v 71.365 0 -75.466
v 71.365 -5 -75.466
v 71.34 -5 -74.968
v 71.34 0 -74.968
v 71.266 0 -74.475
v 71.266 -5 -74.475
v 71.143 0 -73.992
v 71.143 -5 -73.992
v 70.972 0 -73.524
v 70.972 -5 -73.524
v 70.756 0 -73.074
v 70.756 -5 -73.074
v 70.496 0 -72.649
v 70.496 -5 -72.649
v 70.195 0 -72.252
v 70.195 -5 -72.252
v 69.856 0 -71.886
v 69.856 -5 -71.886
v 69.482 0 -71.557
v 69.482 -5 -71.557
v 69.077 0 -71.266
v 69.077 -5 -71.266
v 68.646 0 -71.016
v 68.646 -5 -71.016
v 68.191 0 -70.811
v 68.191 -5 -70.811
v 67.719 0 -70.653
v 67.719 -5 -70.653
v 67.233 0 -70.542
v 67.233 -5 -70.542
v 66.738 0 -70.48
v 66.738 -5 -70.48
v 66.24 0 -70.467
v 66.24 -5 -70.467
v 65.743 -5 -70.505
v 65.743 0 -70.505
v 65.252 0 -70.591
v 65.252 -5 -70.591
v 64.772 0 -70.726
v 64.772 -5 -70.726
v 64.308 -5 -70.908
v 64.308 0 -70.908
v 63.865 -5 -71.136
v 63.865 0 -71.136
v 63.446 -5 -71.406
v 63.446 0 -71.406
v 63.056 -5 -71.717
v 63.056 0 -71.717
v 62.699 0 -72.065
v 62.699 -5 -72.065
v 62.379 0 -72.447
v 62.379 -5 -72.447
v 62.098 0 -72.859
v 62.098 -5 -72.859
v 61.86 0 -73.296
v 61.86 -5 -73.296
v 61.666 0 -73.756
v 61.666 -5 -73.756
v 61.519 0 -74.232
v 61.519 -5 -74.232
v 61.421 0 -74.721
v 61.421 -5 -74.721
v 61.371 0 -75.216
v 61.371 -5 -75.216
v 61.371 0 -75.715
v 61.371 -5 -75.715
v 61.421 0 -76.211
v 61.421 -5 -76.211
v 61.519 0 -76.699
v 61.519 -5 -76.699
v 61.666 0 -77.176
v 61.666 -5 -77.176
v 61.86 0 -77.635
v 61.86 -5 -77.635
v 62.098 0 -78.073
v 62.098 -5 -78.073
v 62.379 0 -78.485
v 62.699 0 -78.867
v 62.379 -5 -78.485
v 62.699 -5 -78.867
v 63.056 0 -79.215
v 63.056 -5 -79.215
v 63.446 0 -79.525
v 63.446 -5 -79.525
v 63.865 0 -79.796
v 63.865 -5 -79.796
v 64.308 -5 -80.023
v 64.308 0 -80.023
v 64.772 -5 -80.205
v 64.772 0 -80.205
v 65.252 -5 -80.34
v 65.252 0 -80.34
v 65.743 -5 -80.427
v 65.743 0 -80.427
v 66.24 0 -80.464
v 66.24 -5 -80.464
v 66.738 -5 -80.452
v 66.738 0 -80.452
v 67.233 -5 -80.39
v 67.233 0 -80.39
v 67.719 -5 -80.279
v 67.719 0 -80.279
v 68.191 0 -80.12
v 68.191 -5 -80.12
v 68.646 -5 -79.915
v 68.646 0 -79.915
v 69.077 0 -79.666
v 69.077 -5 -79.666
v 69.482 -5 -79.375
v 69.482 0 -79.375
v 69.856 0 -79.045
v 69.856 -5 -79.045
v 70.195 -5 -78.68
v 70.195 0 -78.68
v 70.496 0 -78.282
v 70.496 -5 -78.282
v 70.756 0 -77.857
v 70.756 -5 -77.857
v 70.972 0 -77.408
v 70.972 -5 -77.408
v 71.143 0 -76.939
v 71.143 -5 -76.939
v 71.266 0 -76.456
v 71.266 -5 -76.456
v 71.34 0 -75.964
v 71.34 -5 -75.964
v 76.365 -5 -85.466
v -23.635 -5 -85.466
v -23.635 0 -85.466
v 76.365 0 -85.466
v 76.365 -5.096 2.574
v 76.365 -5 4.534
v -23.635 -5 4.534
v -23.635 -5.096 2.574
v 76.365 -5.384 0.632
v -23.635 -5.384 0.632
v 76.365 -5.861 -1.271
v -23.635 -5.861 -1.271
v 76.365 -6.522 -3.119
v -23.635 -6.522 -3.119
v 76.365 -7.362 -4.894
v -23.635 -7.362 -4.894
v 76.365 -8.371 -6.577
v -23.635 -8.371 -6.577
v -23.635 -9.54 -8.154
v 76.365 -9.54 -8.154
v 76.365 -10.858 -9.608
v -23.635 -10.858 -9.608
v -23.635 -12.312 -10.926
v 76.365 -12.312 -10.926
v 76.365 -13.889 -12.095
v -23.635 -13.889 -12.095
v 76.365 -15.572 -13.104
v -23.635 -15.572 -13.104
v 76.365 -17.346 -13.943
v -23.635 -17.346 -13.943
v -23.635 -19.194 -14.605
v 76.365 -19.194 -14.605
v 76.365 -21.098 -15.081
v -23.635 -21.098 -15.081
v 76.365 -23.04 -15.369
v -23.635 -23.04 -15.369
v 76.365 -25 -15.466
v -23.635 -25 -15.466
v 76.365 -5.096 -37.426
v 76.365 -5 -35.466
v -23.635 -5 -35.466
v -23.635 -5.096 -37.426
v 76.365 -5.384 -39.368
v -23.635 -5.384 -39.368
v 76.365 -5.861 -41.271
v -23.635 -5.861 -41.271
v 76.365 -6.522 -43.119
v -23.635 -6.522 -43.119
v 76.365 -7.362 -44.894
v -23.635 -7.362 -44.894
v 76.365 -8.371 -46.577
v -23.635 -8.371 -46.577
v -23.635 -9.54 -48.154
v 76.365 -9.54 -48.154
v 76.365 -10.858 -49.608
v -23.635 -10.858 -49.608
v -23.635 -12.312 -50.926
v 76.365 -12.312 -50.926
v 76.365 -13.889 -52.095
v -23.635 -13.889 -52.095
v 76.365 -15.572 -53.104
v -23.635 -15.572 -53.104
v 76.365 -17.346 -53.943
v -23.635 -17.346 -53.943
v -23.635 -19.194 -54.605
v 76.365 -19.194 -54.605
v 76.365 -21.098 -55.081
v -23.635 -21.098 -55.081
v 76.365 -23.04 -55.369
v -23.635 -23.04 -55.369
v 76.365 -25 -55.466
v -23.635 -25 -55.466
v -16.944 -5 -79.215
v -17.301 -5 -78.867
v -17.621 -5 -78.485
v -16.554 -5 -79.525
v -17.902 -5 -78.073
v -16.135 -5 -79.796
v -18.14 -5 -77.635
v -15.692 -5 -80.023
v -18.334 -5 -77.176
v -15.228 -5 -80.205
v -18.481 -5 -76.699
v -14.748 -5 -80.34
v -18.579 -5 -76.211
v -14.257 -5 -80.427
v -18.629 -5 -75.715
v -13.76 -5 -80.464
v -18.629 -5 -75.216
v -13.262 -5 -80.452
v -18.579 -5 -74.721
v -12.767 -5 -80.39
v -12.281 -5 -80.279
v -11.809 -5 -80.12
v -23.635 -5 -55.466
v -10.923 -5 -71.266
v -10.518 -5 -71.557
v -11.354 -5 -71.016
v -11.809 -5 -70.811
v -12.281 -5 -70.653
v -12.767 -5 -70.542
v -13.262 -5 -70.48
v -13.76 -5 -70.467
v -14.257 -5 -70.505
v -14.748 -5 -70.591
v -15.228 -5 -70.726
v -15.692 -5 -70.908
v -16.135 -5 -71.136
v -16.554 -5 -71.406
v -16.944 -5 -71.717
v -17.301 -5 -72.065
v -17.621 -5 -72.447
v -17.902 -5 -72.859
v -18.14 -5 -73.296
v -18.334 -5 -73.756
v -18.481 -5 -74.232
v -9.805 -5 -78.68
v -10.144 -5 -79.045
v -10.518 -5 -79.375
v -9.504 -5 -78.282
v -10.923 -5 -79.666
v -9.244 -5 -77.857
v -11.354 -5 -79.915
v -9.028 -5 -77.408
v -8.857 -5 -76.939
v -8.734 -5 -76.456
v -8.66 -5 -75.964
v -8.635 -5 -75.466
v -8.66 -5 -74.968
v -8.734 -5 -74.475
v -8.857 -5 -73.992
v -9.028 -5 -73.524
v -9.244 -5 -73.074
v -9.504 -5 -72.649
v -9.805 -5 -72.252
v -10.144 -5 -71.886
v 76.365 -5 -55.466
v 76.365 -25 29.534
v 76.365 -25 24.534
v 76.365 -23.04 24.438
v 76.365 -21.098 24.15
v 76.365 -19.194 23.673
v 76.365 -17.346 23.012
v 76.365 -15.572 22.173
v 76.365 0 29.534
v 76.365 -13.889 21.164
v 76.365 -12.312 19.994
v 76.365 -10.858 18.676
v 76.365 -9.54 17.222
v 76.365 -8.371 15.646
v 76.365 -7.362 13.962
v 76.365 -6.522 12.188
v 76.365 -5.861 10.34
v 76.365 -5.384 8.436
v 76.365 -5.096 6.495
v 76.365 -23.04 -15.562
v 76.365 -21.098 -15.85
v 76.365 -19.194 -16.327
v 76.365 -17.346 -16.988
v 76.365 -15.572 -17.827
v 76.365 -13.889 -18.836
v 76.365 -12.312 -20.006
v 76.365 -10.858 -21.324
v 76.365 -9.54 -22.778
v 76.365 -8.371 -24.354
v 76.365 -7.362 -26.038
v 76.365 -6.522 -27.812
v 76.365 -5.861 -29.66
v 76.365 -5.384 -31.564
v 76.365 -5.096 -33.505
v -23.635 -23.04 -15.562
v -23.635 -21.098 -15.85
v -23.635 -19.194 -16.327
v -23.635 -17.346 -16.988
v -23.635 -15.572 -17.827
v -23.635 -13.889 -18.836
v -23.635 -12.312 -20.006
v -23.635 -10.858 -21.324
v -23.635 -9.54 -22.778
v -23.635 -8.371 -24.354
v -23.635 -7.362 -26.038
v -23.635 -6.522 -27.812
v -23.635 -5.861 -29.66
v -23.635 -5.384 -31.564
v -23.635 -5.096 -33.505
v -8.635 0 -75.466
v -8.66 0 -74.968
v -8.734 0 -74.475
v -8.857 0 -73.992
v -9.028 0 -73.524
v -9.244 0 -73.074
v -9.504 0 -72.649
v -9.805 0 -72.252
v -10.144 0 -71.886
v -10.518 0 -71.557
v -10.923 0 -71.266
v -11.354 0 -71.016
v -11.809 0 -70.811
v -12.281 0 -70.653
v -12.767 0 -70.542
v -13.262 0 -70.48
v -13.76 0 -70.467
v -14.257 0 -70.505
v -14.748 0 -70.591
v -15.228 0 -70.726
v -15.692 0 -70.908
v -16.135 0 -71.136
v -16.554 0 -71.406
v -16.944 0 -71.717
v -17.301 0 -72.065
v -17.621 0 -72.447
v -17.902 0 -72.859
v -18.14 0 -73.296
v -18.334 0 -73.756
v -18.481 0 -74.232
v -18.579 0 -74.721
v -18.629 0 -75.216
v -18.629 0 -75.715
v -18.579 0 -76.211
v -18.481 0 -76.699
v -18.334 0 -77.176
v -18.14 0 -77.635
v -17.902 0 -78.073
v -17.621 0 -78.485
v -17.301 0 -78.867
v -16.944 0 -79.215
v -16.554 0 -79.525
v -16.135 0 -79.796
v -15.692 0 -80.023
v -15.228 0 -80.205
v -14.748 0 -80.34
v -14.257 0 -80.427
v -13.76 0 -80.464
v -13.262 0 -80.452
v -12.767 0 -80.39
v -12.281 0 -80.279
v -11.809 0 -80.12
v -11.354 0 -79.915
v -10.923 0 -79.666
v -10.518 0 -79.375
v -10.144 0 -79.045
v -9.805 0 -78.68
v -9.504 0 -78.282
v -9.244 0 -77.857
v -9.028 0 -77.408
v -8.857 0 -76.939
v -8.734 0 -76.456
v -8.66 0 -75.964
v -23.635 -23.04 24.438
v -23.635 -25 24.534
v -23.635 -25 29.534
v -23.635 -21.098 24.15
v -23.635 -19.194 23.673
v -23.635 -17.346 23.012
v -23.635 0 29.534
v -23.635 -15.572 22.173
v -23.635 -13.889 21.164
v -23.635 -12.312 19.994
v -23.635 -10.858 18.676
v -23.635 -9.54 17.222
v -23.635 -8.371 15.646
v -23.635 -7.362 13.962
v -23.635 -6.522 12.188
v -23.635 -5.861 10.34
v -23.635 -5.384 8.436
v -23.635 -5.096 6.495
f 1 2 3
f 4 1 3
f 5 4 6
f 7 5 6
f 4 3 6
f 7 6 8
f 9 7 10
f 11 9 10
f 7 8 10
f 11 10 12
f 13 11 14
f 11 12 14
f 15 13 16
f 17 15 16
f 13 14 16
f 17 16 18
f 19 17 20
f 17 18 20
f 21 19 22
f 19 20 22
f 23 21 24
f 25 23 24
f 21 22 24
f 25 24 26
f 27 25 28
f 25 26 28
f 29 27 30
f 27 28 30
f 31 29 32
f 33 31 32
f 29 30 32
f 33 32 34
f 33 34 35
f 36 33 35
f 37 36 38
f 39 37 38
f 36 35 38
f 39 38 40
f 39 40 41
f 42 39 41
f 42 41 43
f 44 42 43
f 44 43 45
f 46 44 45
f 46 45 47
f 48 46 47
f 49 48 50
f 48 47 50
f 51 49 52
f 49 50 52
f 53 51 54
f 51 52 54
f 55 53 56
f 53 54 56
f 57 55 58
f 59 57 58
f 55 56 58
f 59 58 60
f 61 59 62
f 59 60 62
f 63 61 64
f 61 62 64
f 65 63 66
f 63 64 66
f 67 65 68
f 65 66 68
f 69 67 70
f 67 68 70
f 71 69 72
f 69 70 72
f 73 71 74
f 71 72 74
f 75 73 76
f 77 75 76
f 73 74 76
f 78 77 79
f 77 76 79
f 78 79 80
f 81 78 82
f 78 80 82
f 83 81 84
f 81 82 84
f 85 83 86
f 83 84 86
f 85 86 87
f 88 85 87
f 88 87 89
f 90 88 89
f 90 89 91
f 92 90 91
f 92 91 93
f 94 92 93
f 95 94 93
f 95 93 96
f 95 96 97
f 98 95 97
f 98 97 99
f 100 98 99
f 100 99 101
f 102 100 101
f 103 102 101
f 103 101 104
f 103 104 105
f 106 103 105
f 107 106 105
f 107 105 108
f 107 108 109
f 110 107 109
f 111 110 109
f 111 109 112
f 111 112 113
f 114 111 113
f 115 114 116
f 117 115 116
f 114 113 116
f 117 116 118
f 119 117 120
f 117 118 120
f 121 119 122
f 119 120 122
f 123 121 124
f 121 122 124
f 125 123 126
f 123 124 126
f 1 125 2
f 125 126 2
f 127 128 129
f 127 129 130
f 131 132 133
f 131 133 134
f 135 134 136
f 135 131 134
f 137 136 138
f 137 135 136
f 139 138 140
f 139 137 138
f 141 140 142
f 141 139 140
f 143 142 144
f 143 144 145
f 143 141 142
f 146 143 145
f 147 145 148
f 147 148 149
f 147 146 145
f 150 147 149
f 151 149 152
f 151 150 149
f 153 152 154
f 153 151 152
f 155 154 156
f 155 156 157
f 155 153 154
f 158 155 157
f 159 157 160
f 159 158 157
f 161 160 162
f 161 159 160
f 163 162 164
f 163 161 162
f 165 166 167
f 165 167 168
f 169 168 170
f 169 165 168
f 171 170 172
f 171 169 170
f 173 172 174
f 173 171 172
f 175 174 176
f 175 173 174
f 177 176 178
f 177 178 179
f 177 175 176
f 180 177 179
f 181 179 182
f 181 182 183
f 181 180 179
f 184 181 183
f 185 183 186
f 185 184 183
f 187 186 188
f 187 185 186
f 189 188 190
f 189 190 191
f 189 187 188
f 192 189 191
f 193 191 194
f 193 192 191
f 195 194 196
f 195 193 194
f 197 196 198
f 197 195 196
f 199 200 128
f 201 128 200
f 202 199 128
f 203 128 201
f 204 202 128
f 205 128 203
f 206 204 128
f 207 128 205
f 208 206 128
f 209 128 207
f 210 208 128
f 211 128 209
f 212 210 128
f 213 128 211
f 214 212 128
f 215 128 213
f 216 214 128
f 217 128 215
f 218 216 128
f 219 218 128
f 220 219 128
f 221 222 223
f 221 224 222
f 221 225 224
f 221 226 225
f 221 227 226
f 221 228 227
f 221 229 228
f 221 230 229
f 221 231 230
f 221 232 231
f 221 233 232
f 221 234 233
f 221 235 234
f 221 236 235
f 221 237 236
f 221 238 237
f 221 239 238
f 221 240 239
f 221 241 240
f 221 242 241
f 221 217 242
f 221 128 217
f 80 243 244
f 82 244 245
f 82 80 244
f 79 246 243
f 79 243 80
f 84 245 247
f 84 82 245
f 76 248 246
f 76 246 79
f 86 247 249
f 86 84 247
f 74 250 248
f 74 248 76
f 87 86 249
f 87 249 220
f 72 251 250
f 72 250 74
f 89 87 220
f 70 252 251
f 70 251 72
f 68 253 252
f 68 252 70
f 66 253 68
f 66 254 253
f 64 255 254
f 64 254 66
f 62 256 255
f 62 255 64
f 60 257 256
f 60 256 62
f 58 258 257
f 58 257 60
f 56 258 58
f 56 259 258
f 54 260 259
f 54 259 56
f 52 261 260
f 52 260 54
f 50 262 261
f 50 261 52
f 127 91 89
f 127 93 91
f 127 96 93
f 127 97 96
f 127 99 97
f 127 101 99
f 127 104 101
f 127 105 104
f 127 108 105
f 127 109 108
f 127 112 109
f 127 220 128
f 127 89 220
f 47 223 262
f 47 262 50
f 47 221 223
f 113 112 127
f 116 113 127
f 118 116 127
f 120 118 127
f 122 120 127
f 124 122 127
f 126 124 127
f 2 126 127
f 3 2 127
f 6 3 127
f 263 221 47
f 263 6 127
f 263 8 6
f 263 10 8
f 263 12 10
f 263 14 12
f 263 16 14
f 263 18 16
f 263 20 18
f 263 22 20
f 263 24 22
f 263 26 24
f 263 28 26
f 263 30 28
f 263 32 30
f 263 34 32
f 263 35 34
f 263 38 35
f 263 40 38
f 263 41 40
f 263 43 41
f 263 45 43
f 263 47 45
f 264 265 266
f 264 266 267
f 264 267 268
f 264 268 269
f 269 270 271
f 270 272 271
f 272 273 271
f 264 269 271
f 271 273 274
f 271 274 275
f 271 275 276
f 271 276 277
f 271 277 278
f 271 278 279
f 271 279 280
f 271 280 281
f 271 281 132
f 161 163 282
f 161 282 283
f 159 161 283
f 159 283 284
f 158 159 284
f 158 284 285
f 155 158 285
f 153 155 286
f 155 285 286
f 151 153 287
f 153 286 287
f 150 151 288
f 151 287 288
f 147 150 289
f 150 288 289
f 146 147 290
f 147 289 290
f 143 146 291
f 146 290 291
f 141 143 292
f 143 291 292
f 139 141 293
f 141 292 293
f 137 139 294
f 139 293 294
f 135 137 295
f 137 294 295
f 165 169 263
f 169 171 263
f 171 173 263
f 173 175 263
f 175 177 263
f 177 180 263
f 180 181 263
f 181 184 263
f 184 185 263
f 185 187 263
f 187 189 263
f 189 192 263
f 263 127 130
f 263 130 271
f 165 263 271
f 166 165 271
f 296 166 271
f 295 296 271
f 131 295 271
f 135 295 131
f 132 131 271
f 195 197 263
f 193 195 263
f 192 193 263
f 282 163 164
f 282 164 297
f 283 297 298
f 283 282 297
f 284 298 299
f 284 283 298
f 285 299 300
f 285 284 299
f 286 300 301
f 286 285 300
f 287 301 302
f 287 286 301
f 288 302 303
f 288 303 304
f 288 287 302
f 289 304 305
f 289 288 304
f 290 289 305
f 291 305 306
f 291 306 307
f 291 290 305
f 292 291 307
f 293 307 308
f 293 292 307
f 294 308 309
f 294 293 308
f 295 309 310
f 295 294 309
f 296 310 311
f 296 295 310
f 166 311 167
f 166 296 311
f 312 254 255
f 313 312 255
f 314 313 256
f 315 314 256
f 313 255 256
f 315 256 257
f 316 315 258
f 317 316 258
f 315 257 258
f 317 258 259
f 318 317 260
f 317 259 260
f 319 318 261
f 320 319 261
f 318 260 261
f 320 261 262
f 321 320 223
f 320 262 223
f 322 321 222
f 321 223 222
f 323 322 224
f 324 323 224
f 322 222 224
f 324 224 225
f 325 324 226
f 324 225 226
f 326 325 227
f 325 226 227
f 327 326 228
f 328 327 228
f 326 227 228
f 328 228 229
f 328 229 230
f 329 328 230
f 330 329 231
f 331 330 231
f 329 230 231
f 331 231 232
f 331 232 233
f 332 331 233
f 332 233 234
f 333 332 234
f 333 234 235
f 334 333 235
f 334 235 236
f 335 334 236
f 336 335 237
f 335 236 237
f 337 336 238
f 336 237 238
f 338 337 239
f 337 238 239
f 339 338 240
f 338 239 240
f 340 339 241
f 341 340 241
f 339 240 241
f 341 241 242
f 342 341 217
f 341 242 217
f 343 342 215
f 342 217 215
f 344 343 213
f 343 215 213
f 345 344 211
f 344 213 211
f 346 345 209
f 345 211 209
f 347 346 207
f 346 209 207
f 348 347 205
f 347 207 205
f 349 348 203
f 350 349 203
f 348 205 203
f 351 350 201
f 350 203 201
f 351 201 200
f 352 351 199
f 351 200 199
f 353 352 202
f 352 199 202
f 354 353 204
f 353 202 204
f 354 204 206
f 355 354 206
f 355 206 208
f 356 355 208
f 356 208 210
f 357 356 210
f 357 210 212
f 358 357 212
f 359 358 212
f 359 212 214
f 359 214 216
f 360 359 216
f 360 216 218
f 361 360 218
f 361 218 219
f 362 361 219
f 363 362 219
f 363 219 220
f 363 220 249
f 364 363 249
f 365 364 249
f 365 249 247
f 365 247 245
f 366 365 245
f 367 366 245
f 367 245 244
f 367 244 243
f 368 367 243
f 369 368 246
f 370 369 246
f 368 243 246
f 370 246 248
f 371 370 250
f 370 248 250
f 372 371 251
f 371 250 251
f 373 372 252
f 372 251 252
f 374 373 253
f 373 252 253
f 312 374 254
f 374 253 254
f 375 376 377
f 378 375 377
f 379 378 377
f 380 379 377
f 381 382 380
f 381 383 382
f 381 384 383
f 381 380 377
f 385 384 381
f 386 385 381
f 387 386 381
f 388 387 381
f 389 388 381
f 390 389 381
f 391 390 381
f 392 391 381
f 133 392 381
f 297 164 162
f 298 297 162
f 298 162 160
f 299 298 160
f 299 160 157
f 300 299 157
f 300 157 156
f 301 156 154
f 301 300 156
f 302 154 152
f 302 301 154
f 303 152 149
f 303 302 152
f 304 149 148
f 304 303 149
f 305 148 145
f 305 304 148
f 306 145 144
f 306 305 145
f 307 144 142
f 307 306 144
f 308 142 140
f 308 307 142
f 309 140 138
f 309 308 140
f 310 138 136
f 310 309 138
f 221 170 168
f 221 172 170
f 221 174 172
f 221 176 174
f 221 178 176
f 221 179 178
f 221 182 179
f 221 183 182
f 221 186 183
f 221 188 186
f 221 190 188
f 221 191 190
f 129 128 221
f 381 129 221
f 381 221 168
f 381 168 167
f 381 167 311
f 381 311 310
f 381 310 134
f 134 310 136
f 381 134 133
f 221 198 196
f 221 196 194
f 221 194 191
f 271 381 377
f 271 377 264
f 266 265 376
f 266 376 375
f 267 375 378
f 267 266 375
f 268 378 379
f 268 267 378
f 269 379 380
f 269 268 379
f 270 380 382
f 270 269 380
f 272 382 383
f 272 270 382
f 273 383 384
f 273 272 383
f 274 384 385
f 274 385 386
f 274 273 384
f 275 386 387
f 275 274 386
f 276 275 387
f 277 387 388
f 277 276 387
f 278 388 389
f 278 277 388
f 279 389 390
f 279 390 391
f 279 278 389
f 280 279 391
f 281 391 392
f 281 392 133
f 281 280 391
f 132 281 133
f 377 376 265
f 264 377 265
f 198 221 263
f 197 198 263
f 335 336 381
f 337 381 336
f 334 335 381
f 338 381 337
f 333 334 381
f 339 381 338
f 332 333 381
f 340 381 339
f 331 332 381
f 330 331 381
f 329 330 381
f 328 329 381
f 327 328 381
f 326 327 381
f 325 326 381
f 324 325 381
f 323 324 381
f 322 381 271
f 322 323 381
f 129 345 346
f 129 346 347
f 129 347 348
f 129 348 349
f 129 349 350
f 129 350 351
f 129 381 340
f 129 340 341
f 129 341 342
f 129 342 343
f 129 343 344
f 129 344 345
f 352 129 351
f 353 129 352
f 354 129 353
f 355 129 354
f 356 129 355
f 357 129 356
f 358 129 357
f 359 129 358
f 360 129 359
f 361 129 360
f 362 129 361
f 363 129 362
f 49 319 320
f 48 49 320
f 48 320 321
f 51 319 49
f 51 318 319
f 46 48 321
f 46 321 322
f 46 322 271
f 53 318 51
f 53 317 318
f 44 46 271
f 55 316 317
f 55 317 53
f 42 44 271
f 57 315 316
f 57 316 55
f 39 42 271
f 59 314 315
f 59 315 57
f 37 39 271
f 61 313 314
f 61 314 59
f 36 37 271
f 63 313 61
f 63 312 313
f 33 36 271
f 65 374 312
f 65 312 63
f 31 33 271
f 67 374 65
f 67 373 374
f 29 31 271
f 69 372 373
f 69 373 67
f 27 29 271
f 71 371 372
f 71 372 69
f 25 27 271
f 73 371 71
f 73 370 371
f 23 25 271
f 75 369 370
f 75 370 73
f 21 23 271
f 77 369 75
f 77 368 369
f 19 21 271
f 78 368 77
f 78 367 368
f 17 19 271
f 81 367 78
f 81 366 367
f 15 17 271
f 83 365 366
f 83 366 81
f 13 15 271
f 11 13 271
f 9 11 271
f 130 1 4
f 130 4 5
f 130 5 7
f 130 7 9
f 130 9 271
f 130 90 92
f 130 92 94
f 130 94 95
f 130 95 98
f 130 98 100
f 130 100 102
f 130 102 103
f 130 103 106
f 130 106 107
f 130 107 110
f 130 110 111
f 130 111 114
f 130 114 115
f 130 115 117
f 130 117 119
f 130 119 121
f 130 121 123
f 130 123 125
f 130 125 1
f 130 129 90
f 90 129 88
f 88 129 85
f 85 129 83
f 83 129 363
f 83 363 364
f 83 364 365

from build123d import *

# Parameters (mm, degrees)
F0_W     = 100
F0_H     = 80
F1_DEPTH = 5
F3_DEPTH = 100
F4_W     = 100
F4_H     = 5
F5_DEPTH = 30
F6_R     = 5
F7_DEPTH = 5
F8_W     = 100
F8_H     = 25
F9_DEPTH = 5


with BuildPart() as f1:
    # F0 (on Front) → F1 (new body)
    with BuildSketch(Plane.XZ):
        with Locations((26.364678, -15.465713)):
            Rectangle(F0_W, F0_H)
    extrude(amount=F1_DEPTH)

    # F2 (on face) → F3 (join)
    with BuildSketch(Plane.YZ.offset(76.364678)):
        with BuildLine():
            ThreePointArc((-25, 24.534287), (-10.857864, 18.676422), (-5, 4.534287))
            Line((-5, 4.534287), (-5, 24.534287))
            Line((-5, 24.534287), (-25, 24.534287))
        make_face()
        with BuildLine():
            ThreePointArc((-25, -15.465713), (-10.857864, -21.323578), (-5, -35.465713))
            Line((-5, -35.465713), (-5, 4.534287))
            ThreePointArc((-5, 4.534287), (-10.857864, -9.607849), (-25, -15.465713))
        make_face()
        with BuildLine():
            ThreePointArc((-5, -35.465713), (-10.857864, -49.607849), (-25, -55.465713))
            Line((-25, -55.465713), (-5, -55.465713))
            Line((-5, -55.465713), (-5, -35.465713))
        make_face()
    extrude(amount=-F3_DEPTH)

    # F4 (on face) → F5 (join)
    with BuildSketch(Plane(origin=(0, 0, -55.465713), x_dir=(1, 0, 0), z_dir=(0, 0, -1))):
        with Locations((26.364678, 2.5)):
            Rectangle(F4_W, F4_H)
    extrude(amount=F5_DEPTH)

    # F6 (on face) → F7 (cut)
    with BuildSketch(Plane.XZ.offset(5)):
        with Locations((66.364678, -75.465713)):
            Circle(F6_R)
        with Locations((-13.635322, -75.465713)):
            Circle(F6_R)
    extrude(amount=-F7_DEPTH, mode=Mode.SUBTRACT)

    # F8 (on face) → F9 (join)
    with BuildSketch(Plane.XY.offset(24.534287)):
        with Locations((26.364678, -12.5)):
            Rectangle(F8_W, F8_H)
    extrude(amount=F9_DEPTH)


solid = f1.part
